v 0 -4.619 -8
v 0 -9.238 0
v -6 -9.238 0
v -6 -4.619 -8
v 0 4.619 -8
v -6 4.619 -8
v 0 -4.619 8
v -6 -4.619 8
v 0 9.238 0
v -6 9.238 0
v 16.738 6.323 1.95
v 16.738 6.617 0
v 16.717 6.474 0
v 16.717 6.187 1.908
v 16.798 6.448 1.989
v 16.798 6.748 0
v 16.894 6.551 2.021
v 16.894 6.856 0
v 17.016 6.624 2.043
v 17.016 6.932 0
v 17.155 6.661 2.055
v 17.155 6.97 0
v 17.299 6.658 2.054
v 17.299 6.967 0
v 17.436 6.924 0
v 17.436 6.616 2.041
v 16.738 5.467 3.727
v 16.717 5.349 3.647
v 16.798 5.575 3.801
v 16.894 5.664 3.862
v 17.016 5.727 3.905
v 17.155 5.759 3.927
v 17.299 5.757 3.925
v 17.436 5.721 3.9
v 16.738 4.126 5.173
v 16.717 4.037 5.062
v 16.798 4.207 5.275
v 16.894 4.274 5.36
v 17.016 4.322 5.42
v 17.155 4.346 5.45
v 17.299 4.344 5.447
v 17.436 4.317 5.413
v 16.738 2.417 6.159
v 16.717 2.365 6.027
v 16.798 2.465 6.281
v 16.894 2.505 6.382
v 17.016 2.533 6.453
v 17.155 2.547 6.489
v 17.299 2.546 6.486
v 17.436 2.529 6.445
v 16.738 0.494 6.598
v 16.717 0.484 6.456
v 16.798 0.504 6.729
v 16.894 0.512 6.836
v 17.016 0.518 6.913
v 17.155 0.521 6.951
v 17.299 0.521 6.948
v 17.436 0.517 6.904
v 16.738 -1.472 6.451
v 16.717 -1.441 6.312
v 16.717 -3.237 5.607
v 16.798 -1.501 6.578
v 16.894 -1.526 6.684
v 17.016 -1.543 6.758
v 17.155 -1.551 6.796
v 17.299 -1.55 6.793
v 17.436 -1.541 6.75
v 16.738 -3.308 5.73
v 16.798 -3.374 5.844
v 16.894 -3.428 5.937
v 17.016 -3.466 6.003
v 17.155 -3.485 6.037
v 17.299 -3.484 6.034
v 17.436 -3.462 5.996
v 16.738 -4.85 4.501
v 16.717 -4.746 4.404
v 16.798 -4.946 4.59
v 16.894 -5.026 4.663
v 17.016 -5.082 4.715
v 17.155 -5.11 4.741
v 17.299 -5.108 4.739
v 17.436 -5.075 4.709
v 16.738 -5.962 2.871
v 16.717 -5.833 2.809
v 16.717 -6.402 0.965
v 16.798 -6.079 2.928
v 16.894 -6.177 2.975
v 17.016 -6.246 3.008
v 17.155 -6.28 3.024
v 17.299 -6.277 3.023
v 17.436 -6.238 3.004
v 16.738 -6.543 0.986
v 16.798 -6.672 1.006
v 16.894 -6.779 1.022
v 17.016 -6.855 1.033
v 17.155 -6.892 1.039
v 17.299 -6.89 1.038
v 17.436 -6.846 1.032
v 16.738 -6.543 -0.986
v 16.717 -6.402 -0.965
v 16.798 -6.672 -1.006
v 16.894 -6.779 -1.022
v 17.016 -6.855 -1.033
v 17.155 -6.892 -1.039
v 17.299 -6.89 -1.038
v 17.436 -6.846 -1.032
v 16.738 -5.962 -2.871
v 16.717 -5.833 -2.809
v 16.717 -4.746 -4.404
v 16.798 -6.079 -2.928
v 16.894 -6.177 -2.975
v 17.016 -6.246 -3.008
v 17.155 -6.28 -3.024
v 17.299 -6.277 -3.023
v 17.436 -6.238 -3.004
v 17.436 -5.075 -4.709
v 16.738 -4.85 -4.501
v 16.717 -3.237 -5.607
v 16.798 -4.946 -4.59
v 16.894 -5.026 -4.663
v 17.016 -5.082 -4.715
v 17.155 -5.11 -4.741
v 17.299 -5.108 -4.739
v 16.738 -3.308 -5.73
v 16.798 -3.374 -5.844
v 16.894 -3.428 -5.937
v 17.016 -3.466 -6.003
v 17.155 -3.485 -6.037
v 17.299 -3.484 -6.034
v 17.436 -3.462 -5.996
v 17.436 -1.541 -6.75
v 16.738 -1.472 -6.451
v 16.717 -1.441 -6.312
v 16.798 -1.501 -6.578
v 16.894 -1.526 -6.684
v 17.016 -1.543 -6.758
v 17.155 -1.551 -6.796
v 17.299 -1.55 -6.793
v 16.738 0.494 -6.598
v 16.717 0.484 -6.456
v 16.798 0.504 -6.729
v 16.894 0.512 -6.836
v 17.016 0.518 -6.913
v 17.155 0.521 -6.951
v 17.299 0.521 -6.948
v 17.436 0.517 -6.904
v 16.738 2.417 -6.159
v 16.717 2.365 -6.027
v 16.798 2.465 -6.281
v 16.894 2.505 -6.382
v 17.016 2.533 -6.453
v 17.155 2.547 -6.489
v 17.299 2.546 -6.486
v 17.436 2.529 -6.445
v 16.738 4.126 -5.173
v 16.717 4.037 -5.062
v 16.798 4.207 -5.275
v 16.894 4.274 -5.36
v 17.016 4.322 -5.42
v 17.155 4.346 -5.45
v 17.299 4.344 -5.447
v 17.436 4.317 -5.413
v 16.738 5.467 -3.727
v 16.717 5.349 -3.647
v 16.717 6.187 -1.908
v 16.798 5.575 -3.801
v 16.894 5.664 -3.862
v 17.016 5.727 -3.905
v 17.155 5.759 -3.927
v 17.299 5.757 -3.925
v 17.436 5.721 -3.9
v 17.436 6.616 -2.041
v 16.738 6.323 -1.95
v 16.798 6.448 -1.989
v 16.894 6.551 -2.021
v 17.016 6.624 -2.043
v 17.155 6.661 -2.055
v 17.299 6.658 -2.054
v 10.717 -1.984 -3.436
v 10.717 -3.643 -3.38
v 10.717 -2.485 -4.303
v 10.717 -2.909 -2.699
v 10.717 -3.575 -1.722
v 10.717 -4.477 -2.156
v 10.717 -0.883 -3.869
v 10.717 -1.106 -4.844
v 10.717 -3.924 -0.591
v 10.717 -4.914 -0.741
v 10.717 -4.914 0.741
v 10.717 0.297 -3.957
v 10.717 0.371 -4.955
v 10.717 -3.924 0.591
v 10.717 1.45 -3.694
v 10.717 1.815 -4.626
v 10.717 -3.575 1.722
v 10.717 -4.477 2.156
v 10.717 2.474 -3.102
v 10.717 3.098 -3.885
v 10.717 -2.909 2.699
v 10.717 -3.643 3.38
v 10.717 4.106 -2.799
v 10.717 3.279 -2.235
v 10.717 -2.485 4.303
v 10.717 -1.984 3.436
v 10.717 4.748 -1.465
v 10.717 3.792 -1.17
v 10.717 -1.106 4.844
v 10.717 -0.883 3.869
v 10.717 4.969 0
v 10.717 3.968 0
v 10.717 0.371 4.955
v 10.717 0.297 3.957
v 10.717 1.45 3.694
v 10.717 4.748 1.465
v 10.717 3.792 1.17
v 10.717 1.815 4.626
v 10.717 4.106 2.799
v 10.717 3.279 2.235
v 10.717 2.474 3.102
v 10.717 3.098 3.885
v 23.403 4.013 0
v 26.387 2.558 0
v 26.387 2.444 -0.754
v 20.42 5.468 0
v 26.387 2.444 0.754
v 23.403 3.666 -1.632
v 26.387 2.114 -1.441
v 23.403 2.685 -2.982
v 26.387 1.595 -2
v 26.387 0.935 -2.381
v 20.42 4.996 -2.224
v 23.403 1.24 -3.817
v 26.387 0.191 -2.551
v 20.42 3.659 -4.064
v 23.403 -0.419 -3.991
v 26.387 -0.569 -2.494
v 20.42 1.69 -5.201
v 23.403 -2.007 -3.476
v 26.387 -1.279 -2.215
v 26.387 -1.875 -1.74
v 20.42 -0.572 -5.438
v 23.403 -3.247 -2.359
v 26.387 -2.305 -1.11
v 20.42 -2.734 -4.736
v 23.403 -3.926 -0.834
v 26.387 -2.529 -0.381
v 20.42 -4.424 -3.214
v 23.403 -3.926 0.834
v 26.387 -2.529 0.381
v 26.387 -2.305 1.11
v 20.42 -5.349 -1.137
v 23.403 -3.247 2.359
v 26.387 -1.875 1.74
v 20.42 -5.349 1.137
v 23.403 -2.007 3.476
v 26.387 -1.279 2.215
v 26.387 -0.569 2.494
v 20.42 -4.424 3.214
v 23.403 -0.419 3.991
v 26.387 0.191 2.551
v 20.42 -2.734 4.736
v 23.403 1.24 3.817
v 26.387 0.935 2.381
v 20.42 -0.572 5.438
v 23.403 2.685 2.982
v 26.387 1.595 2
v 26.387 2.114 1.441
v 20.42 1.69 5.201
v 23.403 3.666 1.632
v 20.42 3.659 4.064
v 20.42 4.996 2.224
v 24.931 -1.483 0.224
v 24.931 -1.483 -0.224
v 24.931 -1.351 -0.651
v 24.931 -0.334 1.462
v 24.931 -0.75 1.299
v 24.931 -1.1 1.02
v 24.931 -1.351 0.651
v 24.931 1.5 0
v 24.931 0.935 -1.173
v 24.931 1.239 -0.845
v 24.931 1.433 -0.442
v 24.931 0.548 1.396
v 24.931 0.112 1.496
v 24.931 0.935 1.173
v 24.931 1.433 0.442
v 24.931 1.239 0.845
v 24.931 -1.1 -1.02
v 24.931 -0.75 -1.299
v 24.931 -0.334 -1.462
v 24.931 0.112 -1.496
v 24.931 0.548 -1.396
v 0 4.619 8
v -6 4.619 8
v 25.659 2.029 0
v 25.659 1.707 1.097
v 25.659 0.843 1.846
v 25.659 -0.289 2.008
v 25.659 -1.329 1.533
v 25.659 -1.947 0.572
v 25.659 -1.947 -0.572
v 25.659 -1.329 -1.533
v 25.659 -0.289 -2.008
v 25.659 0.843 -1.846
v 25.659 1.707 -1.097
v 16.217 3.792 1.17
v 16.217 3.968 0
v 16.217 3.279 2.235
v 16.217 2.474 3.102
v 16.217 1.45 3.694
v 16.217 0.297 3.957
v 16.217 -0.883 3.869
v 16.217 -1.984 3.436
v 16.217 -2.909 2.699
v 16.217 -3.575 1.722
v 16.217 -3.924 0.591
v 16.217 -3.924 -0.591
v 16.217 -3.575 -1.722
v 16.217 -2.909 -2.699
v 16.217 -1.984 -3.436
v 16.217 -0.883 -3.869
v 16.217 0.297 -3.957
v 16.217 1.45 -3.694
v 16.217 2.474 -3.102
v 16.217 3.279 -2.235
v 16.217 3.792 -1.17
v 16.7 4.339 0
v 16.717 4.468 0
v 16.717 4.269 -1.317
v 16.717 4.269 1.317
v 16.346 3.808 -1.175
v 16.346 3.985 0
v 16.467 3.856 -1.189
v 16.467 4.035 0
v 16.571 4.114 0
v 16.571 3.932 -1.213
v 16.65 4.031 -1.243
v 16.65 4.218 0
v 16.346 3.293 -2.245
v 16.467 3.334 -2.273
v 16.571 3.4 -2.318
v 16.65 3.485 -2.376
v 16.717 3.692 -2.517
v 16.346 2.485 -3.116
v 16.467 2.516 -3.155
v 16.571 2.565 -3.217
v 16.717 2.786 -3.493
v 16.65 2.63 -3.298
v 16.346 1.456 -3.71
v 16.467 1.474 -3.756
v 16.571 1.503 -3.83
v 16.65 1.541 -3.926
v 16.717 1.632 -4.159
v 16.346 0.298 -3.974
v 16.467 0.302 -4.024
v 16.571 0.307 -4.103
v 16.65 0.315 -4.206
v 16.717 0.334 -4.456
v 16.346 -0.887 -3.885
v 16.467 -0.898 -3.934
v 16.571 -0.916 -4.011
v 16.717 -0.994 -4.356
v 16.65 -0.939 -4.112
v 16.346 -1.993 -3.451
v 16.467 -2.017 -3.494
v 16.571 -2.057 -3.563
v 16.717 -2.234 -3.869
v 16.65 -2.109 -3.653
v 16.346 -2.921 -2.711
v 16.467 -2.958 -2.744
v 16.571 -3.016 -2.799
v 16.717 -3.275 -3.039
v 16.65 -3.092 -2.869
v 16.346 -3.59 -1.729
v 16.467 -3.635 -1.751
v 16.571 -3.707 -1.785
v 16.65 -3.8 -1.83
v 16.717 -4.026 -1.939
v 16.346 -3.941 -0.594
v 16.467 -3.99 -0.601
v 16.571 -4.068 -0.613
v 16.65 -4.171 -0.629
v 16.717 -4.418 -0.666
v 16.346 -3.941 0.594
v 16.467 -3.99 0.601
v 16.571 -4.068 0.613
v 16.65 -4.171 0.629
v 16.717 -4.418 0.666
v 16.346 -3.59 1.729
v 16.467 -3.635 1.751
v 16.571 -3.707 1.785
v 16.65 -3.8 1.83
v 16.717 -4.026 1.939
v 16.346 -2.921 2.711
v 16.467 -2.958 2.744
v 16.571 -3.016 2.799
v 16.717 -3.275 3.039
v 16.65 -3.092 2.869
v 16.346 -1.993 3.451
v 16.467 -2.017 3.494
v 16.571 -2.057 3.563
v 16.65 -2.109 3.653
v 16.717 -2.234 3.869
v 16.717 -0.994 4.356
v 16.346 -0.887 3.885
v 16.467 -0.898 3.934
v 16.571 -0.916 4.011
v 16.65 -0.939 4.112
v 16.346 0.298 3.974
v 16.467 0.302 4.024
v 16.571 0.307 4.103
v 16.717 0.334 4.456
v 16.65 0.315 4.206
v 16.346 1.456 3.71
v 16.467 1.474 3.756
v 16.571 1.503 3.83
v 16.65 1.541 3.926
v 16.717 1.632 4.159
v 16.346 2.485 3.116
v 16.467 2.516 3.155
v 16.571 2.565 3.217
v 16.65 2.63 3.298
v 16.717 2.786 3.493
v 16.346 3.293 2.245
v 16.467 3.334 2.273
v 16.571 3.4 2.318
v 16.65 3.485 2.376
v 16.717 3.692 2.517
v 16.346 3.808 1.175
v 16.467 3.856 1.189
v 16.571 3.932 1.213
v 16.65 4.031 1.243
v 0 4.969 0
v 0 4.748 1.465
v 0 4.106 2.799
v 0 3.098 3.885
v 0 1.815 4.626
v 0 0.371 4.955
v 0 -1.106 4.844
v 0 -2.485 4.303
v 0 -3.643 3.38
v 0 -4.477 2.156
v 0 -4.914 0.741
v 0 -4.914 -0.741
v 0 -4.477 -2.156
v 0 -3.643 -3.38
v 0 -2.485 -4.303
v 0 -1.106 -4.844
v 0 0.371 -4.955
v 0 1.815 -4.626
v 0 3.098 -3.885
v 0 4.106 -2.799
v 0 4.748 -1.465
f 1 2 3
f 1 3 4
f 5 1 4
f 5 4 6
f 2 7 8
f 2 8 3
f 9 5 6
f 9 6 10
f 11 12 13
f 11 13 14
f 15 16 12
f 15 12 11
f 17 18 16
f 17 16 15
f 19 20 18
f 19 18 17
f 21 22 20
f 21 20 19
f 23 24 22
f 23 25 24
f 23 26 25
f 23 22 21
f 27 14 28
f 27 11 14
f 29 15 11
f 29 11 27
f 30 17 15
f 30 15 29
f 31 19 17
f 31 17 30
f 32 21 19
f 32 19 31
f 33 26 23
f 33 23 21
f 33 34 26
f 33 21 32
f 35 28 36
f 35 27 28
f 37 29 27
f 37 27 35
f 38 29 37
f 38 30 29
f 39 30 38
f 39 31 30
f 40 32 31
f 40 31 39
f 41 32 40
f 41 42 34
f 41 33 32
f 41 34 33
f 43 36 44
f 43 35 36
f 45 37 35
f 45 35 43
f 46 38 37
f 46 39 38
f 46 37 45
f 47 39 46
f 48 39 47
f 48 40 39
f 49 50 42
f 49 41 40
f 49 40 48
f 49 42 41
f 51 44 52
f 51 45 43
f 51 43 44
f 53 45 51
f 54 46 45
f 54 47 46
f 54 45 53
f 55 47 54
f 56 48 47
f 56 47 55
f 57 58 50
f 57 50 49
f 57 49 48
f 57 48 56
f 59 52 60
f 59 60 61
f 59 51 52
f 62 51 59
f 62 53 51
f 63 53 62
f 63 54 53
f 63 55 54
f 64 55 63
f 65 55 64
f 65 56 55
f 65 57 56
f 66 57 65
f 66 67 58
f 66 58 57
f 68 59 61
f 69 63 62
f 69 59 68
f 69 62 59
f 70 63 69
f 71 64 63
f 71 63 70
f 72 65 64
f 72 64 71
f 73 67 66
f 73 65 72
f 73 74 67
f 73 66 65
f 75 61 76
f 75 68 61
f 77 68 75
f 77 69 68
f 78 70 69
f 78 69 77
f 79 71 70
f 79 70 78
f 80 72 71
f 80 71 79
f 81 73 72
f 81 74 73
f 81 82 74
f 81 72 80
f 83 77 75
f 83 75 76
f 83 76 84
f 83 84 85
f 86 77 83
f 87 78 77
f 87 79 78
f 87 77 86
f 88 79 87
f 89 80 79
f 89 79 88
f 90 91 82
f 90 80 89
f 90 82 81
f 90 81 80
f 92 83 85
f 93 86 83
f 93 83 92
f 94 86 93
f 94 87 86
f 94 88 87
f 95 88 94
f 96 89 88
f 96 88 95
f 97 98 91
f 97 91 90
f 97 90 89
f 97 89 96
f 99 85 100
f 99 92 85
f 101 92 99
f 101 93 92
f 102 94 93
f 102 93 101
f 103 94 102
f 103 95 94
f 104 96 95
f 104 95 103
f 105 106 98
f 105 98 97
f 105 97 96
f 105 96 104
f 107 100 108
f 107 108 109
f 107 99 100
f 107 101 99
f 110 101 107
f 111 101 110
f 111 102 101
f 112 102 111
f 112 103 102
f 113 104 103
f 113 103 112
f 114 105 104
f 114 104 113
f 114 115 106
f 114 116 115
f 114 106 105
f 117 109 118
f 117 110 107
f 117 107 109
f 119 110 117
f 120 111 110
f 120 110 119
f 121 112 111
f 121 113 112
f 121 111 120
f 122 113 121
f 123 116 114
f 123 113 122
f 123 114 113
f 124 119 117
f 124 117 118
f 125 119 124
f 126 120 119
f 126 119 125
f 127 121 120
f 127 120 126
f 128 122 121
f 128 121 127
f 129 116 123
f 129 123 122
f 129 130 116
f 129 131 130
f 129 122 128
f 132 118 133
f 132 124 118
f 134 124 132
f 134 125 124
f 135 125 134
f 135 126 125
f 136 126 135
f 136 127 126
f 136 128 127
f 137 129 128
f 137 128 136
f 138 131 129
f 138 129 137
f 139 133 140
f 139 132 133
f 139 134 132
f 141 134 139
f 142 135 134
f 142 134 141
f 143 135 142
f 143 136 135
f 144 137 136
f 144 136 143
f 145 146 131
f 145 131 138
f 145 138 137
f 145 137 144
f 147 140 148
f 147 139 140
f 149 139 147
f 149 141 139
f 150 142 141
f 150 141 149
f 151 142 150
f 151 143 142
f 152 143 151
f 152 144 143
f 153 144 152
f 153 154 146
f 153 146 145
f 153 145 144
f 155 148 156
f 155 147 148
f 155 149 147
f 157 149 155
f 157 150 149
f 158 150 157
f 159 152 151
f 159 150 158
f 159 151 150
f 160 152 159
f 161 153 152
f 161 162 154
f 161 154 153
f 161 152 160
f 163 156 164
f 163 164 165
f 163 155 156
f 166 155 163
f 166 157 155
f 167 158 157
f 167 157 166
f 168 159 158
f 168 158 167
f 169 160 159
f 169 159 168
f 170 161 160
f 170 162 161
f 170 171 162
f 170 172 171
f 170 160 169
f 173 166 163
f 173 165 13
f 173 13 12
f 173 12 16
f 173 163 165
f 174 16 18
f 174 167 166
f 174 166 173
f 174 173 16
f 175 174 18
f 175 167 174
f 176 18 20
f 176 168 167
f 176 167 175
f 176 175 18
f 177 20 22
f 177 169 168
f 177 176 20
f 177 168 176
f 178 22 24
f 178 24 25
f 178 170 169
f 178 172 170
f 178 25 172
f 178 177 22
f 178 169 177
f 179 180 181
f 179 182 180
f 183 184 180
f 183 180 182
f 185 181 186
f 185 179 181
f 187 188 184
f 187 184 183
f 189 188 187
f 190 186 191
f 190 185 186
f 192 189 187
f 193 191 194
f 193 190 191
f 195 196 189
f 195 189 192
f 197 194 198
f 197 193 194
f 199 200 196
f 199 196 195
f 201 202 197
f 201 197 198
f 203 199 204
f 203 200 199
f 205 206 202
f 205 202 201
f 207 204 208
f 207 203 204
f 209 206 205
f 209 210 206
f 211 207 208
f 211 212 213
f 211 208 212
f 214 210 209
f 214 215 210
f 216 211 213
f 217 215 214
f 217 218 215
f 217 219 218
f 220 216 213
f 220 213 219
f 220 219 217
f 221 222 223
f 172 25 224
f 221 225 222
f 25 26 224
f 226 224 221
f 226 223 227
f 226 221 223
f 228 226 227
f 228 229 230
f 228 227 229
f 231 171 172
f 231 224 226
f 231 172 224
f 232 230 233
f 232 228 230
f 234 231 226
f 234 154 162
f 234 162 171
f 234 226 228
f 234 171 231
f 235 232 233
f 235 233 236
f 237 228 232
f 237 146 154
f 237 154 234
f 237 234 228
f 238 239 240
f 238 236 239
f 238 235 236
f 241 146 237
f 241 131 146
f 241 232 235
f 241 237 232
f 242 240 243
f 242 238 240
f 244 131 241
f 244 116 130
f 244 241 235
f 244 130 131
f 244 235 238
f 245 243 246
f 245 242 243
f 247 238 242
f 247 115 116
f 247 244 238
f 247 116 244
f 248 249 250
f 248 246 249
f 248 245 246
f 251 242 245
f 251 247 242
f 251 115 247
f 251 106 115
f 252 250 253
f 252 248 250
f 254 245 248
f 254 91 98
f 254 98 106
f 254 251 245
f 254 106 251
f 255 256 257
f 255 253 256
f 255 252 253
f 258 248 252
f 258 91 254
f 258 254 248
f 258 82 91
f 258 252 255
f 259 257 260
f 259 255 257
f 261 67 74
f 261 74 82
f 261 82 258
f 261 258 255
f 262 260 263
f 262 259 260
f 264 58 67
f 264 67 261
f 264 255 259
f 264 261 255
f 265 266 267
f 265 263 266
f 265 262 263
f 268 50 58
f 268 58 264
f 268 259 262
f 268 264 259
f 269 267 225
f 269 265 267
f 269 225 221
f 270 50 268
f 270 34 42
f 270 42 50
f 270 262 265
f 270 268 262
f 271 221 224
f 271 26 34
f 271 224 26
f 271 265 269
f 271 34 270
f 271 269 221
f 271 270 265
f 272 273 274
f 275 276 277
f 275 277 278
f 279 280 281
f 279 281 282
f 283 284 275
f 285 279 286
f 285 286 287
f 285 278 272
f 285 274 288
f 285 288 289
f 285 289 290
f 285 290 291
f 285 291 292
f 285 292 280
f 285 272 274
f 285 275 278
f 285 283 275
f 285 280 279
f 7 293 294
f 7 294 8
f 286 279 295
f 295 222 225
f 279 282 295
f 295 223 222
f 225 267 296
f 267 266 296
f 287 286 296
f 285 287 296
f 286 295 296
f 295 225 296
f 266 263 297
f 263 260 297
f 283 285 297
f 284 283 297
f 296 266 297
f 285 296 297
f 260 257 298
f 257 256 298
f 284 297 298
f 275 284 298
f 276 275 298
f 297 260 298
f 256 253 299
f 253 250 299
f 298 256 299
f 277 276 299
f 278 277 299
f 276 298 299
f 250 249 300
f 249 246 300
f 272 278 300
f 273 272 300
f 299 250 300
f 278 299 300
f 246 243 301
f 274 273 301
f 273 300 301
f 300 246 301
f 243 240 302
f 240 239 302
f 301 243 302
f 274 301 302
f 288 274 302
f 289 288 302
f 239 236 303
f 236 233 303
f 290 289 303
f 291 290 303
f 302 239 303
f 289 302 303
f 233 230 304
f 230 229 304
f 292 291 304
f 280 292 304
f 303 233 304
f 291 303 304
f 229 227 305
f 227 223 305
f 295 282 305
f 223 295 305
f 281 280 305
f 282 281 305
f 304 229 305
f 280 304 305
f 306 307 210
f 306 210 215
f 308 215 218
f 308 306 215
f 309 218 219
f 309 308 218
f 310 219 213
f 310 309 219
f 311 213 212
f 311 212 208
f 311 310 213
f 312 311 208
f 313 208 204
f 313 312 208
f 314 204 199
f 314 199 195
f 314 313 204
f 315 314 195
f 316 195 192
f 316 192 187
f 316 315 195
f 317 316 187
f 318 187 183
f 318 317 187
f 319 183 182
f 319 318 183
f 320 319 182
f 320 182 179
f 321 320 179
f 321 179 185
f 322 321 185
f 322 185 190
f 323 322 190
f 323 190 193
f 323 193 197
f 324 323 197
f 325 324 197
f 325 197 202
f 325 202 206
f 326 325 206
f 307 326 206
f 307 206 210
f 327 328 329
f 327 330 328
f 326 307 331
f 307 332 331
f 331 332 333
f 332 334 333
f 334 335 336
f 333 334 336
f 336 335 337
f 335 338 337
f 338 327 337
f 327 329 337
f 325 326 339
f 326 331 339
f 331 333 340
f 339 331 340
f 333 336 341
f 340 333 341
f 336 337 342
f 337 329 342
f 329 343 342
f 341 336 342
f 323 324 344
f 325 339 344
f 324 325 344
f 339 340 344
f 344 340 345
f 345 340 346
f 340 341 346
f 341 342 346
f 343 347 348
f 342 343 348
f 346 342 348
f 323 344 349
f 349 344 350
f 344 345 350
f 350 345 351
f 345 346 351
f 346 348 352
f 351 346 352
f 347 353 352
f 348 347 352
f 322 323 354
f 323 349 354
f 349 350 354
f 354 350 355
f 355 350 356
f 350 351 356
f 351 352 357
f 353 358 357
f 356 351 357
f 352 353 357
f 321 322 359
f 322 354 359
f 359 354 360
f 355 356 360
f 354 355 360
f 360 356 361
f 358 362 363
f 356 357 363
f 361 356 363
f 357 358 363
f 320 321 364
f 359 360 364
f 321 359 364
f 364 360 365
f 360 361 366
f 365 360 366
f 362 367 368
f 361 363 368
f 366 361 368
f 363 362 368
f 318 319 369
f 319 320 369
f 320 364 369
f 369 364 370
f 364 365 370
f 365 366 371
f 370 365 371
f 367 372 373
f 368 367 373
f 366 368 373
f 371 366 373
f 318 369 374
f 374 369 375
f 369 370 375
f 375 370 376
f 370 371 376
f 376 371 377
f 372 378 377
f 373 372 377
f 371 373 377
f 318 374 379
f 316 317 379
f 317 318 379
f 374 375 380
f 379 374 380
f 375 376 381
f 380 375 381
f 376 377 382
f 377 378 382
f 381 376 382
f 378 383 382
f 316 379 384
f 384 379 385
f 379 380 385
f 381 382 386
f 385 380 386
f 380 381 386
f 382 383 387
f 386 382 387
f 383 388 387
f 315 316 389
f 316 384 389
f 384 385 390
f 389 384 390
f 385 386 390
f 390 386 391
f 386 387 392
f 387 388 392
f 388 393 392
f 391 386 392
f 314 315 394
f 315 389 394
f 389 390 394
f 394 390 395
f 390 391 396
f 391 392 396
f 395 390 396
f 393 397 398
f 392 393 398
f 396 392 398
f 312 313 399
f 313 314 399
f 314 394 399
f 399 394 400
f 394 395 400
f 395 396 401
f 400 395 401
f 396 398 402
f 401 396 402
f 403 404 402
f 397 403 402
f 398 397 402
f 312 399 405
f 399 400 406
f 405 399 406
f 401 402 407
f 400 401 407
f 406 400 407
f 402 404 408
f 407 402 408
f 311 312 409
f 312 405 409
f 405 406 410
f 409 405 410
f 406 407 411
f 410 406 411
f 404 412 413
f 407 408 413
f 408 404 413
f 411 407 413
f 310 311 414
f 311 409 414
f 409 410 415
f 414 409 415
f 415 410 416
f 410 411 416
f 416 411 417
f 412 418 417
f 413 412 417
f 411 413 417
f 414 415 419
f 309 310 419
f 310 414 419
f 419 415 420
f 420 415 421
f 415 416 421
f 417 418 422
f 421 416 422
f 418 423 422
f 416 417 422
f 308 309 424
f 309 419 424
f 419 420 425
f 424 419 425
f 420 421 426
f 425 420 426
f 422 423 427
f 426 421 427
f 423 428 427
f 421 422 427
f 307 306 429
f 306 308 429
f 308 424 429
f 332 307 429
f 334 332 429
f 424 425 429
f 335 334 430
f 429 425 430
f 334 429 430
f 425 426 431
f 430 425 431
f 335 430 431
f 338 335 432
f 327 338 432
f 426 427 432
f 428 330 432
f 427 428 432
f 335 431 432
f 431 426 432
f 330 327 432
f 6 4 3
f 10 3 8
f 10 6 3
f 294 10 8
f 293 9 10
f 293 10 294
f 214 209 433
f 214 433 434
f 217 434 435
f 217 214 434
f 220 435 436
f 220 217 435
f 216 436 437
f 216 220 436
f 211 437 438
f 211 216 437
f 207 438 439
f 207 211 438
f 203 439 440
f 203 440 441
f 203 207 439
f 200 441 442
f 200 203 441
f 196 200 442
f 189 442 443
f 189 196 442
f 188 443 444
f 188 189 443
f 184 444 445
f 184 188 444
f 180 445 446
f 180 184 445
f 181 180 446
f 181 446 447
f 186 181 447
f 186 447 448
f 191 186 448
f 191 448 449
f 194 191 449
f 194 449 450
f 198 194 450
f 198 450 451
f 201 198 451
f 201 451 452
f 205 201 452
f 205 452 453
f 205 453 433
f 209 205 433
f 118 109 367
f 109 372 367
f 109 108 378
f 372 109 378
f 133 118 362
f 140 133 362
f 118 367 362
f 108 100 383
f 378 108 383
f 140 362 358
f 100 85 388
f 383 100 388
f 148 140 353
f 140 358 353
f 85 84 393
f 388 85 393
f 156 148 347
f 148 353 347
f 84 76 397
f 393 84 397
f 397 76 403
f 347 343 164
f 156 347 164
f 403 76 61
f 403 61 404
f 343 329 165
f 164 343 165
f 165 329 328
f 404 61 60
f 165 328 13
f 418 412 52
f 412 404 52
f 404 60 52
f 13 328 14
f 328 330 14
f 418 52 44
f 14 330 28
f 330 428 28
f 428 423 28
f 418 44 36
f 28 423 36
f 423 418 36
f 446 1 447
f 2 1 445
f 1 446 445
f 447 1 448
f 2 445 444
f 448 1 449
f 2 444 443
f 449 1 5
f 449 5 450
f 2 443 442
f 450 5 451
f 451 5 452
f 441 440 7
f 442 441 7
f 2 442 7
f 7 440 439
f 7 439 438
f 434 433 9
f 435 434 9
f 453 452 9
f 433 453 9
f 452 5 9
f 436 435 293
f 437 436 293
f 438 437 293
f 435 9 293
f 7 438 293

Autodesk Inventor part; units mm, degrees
ref_plane "YZ Plane" through (0, 0, 0) normal (1, 0, 0) x (0, 1, 0)
ref_plane "XZ Plane" through (0, 0, 0) normal (0, 1, 0) x (-1, 0, 0)
ref_plane "XY Plane" through (0, 0, 0) normal (0, 0, 1) x (1, 0, 0)
sketch "Sketch1" plane through (0, 0, 0) normal (0, 0, 1) x (1, 0, 0)
  line L0 (0, 0) -> (26.387, 0)
  line L1 (0, 0) -> (0, 4.969)
  line L2 (0, 4.969) -> (10.717, 4.969)
  line L3 (10.717, 4.969) -> (10.717, 3.968)
  line L4 (10.717, 3.968) -> (16.717, 3.968)
  line L5 (16.717, 3.968) -> (16.717, 7.2744)
  line L6 (16.717, 7.2744) -> (26.387, 2.558)
  line L7 (26.387, 2.558) -> (24.9308, 1.5)
  line L8 (24.9308, 1.5) -> (24.9308, 0)
  dimension "d0" = 10.717
  dimension "d1" = 9.938
  dimension "d2" = 7.936
  dimension "d3" = 6
  dimension "d4" = 5.116
  dimension "d6" = 26
  dimension "d8" = 9.67
  dimension "d9" = 36
  dimension "d10" = 3
revolve "Revolution1" add sketch "Sketch1" angle 360 about axis through (0, 0, 0) along (1, 0, 0)
sketch "Sketch2" plane through (0, 0, 0) normal (-1, 0, 0) x (0, 0, 1)
  circle A0 centre (0, 0) radius 4.969 projected
  line L0 (0, 9.2376) -> (8, 4.6188)
  line L1 (8, 4.6188) -> (8, -4.6188)
  line L2 (8, -4.6188) -> (0, -9.2376)
  line L3 (0, -9.2376) -> (-8, -4.6188)
  line L4 (-8, -4.6188) -> (-8, 4.6188)
  line L5 (-8, 4.6188) -> (0, 9.2376)
  dimension "d11" = 16
extrude "Extrusion1" add sketch "Sketch2" along normal blind 6 contours A0 | L0 L1 L2 L3 L4 L5
fillet "Fillet1" radius 0.5 2 edges at (16.717, -3.968, 0) (16.717, -7.2744, 0)
properties part number "212-05" material "Titanium"
